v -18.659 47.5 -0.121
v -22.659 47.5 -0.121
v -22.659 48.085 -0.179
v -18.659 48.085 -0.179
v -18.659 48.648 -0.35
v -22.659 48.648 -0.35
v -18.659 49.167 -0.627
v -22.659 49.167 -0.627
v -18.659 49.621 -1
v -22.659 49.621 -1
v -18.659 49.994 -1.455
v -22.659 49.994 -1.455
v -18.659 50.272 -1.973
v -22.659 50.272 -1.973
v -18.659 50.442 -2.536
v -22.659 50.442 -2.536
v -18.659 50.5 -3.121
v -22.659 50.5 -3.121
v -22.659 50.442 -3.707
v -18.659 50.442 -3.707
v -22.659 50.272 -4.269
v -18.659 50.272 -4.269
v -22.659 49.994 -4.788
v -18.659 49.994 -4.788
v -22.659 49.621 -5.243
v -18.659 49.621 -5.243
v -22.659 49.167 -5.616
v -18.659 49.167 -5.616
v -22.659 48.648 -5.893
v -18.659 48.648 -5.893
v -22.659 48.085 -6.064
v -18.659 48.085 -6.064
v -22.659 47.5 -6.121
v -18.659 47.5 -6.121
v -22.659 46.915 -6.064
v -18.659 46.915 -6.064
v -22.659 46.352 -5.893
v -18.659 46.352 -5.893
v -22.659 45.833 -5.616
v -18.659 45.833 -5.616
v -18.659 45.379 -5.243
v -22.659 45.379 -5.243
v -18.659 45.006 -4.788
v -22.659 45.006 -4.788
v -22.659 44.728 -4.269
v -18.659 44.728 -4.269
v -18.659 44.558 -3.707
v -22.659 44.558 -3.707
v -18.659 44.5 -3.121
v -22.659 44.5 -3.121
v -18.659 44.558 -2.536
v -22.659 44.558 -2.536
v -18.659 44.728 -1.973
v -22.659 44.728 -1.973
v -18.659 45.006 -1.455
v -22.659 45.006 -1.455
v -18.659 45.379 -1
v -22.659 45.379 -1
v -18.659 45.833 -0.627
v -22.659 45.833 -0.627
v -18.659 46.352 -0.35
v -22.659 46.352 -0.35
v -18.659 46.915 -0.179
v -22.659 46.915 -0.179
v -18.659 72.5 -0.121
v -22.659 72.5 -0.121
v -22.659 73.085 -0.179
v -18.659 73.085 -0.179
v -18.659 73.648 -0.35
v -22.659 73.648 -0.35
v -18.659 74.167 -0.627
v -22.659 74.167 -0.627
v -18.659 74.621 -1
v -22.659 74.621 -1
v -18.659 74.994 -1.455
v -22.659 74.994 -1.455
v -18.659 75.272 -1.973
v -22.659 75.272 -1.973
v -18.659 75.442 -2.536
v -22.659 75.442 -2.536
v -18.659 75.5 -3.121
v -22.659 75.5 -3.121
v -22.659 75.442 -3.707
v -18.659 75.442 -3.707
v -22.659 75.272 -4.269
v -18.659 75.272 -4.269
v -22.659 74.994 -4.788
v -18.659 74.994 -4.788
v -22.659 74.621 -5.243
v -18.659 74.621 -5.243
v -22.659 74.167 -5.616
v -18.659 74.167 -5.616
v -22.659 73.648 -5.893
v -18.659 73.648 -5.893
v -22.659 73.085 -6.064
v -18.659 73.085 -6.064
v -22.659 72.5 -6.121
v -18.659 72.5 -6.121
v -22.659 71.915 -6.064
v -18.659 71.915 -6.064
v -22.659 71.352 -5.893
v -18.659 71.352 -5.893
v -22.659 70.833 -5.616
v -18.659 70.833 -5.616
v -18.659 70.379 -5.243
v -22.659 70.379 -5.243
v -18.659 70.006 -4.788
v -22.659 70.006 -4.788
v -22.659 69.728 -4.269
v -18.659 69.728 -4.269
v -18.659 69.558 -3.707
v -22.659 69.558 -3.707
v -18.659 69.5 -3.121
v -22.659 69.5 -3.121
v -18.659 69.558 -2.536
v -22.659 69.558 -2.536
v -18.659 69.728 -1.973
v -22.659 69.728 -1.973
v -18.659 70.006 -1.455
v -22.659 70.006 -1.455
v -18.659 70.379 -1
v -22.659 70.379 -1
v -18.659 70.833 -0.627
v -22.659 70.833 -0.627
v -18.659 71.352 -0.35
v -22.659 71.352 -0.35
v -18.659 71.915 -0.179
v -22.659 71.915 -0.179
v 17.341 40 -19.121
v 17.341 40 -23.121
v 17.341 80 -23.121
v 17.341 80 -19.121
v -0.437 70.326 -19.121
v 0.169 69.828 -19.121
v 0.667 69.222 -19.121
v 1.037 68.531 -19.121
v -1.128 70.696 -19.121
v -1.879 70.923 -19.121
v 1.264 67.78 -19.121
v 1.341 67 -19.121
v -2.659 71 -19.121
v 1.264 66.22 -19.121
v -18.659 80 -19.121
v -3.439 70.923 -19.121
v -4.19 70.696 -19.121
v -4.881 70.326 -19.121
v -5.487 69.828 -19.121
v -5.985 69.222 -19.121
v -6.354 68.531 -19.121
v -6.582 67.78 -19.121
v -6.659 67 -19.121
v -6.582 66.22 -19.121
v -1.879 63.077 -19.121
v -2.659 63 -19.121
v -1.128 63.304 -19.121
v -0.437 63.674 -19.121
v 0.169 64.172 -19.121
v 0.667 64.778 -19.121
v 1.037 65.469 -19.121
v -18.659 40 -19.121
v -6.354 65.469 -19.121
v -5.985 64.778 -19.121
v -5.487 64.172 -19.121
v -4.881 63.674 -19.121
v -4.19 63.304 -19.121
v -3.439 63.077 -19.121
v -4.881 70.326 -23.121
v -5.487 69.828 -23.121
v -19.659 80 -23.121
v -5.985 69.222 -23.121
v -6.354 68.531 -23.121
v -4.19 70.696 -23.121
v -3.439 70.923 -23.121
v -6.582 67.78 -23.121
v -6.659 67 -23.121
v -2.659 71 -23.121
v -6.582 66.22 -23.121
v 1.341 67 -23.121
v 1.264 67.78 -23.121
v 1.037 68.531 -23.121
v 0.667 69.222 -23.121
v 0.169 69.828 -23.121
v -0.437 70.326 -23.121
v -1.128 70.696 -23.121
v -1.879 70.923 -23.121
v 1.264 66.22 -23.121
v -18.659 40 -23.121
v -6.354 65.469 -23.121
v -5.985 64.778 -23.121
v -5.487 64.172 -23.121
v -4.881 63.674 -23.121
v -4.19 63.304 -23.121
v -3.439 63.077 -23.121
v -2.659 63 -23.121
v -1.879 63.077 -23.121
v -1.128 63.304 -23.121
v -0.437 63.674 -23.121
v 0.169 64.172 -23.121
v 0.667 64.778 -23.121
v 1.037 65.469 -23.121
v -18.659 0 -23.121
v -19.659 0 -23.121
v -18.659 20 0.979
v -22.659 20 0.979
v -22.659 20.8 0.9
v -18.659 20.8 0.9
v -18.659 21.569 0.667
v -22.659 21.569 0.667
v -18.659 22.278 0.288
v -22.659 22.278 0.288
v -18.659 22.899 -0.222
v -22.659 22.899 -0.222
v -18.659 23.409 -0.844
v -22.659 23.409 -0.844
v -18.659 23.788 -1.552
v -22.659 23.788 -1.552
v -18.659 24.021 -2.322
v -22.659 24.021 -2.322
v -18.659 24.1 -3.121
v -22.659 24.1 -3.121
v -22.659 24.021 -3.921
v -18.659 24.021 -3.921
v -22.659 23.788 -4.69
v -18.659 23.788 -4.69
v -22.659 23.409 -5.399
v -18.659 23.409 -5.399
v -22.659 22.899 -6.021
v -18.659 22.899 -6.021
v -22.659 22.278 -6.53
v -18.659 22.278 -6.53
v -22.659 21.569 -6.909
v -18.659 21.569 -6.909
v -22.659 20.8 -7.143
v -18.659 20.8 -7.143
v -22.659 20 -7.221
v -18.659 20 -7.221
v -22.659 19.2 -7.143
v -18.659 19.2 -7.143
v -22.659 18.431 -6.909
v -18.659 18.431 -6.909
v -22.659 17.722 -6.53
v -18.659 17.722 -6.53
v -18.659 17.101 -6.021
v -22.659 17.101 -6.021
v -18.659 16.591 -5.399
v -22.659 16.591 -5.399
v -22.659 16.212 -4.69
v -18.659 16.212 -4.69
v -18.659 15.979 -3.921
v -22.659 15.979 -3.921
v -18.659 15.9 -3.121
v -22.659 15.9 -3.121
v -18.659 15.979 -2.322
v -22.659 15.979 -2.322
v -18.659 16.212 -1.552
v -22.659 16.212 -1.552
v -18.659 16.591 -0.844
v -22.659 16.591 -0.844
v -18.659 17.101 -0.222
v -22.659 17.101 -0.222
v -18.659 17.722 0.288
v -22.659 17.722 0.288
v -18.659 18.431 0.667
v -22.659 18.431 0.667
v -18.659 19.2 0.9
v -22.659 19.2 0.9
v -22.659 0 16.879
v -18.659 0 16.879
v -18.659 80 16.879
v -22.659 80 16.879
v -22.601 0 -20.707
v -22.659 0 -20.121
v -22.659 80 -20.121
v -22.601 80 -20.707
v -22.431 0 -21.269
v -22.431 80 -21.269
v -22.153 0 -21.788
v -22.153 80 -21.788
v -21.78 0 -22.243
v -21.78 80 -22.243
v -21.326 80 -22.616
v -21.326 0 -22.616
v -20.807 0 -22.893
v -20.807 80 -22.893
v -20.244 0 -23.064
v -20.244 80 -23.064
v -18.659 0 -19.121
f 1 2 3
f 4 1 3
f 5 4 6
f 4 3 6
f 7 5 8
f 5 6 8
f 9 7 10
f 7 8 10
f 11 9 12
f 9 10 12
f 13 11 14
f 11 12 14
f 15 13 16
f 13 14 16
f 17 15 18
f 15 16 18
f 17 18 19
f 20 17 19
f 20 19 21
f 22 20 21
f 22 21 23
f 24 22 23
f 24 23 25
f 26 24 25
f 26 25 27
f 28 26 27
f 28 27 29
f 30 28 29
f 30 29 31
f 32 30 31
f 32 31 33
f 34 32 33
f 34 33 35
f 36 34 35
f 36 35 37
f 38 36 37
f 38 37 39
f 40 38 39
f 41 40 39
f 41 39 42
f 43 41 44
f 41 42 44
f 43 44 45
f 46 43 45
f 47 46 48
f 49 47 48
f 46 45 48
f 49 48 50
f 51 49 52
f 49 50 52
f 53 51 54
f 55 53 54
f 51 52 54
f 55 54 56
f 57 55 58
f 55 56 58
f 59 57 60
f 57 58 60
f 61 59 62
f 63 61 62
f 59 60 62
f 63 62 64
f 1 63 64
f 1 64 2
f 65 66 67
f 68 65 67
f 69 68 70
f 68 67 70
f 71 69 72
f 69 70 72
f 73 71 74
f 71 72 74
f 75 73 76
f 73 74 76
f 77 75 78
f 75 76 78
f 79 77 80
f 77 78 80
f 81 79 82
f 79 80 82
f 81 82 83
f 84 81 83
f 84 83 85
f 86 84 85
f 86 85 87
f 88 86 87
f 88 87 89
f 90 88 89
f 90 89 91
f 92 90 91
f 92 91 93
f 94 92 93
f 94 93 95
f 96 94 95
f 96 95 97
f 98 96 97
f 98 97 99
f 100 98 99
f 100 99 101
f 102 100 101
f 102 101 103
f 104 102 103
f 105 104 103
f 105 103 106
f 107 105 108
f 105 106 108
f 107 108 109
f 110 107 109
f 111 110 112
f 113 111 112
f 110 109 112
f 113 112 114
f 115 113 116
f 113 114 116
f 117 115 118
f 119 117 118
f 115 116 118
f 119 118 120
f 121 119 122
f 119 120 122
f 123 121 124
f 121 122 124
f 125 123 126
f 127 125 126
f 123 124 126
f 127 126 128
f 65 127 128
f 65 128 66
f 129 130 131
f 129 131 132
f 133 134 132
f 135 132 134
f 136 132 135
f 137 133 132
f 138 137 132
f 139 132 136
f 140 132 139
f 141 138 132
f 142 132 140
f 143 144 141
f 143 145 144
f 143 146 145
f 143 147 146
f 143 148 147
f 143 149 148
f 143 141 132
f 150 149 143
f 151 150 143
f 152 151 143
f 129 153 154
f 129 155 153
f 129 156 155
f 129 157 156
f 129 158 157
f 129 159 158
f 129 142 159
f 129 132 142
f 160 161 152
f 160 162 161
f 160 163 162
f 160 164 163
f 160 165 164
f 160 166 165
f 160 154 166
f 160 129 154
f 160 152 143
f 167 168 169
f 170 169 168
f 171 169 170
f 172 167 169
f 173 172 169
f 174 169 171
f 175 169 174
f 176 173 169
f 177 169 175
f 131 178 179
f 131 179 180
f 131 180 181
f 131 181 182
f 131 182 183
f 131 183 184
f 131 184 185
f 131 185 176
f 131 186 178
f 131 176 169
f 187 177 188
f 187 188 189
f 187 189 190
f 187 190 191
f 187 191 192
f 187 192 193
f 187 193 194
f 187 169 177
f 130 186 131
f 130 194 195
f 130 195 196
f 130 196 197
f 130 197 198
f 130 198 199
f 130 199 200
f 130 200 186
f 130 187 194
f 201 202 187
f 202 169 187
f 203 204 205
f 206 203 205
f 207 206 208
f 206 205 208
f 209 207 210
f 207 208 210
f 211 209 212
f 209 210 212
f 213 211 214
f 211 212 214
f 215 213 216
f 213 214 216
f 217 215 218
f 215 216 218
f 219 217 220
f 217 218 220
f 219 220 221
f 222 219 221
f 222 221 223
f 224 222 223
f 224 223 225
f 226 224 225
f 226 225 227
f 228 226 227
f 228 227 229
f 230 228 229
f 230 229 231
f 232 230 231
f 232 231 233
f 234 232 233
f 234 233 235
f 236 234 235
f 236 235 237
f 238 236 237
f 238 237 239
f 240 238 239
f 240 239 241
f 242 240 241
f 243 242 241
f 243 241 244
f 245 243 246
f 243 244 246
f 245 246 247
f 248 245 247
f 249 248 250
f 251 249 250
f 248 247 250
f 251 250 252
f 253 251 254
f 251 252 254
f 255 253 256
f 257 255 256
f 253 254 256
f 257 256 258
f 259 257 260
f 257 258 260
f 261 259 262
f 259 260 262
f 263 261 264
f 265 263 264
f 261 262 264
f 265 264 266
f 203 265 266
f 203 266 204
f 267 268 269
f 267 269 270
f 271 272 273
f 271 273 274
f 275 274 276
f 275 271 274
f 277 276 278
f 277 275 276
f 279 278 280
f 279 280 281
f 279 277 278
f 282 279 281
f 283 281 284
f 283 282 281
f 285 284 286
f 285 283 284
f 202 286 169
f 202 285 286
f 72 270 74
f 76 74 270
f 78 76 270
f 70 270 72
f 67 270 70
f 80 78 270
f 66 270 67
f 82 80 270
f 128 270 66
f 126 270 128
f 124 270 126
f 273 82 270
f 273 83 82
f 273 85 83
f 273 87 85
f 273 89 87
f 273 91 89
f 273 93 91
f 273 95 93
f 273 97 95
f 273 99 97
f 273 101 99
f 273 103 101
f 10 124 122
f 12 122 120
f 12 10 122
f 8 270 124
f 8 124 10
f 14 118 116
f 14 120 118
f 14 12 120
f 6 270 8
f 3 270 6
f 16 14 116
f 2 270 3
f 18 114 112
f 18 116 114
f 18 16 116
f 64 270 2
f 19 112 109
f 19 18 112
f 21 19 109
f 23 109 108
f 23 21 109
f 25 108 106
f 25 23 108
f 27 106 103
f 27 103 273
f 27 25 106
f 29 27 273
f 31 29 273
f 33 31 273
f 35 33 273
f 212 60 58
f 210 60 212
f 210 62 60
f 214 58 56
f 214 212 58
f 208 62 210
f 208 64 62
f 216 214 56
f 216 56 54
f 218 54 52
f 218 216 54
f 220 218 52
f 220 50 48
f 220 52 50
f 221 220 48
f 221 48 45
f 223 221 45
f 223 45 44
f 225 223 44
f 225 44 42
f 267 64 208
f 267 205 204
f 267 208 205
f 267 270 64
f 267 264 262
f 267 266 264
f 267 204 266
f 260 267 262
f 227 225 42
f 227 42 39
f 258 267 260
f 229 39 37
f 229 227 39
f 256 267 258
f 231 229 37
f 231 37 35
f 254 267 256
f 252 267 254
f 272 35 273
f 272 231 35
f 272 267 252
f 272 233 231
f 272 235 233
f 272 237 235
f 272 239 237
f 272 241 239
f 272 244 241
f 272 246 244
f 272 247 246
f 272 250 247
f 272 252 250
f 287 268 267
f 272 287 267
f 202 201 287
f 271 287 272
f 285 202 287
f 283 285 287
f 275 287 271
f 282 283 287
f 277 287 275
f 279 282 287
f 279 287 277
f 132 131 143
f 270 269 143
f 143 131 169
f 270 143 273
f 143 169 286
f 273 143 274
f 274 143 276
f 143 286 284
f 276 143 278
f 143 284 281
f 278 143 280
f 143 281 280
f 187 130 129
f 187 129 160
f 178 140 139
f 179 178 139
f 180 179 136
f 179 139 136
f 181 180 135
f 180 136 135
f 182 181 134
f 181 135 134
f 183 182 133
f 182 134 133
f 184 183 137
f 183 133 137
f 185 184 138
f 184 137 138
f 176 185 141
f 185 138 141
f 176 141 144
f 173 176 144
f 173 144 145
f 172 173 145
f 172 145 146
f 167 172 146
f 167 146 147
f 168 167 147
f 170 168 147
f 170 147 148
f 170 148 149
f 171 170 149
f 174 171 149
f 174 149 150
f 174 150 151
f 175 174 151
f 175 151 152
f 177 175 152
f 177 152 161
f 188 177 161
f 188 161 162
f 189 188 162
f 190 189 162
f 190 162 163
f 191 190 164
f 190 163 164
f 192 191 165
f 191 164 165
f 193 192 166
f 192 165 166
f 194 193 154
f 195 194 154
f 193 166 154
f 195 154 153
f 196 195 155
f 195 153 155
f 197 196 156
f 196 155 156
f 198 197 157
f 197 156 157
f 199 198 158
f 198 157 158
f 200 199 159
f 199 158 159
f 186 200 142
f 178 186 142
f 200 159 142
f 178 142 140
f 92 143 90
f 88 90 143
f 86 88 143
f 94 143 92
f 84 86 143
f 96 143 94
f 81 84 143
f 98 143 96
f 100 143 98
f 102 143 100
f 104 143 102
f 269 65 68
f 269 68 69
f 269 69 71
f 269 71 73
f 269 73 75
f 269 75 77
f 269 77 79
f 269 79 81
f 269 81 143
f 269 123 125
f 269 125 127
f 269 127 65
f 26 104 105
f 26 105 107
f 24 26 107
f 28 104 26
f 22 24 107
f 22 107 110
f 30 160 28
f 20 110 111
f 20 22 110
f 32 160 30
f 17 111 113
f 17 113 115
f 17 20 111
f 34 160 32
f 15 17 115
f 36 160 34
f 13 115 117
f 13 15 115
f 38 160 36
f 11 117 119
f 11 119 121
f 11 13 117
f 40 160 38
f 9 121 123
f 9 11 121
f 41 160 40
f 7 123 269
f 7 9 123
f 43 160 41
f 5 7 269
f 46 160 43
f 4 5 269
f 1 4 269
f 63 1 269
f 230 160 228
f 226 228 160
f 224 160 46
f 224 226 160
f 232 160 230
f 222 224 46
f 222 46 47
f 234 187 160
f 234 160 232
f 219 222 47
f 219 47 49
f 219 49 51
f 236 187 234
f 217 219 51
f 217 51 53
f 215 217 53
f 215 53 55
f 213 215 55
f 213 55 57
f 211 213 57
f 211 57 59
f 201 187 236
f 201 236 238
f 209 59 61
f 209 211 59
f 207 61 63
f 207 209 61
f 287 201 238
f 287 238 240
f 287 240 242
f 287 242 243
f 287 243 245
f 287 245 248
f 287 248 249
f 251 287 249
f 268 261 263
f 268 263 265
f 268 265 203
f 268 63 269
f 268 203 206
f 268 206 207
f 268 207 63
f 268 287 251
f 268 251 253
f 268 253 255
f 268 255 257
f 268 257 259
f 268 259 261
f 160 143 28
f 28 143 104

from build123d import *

# Parameters (mm, degrees)
EXTRUDE_THIN1_DEPTH   = 80
SKETCH5_R             = 4.1
SKETCH5_R_2           = 3
CUT_EXTRUDE2_DEPTH    = 10
SKETCH6_W             = 57.412547925
SKETCH6_H             = 40
CUT_EXTRUDE3_DEPTH    = 10
F_8_0MM_DOWEL_HOLE1_D = 8


with BuildPart() as part:
    # Sketch1 → Extrude-Thin1 (new body)
    with BuildSketch(Plane(origin=(0, 0, 0), x_dir=(1, 0, 0), z_dir=(0, 1, 0))):
        with BuildLine():
            Line((-22.658959538, -16.878612717), (-22.658959538, 20.121387283))
            ThreePointArc((-22.658959538, 20.121387283), (-21.780279881, 22.242707627), (-19.658959538, 23.121387283))
            Line((-19.658959538, 23.121387283), (17.341040462, 23.121387283))
            Line((17.341040462, 23.121387283), (17.341040462, 19.121387283))
            Line((17.341040462, 19.121387283), (-18.658959538, 19.121387283))
            Line((-18.658959538, 19.121387283), (-18.658959538, -16.878612717))
            Line((-18.658959538, -16.878612717), (-22.658959538, -16.878612717))
        make_face()
    extrude(amount=EXTRUDE_THIN1_DEPTH)

    # Sketch5 → Cut-Extrude2 (cut)
    with BuildSketch(Plane.ZY.offset(22.658959538)):
        with Locations((-3.121387283, 20)):
            Circle(SKETCH5_R)
        with Locations((-3.121387283, 47.5)):
            Circle(SKETCH5_R_2)
        with Locations((-3.121387283, 72.5)):
            Circle(SKETCH5_R_2)
    extrude(amount=-CUT_EXTRUDE2_DEPTH, mode=Mode.SUBTRACT)

    # Sketch6 → Cut-Extrude3 (cut)
    with BuildSketch(Plane(origin=(0, 0, -23.121387283), x_dir=(-1, 0, 0), z_dir=(0, 0, -1))):
        with Locations((-10.047314424, 20)):
            Rectangle(SKETCH6_W, SKETCH6_H)
    extrude(amount=-CUT_EXTRUDE3_DEPTH, mode=Mode.SUBTRACT)

    # Ø8.0mm Dowel Hole1 (through all)
    with Locations(Plane(origin=(0, 0, -23.121387283), x_dir=(-1, 0, 0), z_dir=(0, 0, -1))):
        with Locations((2.658959538, 67)):
            Hole(F_8_0MM_DOWEL_HOLE1_D / 2)


solid = part.part
